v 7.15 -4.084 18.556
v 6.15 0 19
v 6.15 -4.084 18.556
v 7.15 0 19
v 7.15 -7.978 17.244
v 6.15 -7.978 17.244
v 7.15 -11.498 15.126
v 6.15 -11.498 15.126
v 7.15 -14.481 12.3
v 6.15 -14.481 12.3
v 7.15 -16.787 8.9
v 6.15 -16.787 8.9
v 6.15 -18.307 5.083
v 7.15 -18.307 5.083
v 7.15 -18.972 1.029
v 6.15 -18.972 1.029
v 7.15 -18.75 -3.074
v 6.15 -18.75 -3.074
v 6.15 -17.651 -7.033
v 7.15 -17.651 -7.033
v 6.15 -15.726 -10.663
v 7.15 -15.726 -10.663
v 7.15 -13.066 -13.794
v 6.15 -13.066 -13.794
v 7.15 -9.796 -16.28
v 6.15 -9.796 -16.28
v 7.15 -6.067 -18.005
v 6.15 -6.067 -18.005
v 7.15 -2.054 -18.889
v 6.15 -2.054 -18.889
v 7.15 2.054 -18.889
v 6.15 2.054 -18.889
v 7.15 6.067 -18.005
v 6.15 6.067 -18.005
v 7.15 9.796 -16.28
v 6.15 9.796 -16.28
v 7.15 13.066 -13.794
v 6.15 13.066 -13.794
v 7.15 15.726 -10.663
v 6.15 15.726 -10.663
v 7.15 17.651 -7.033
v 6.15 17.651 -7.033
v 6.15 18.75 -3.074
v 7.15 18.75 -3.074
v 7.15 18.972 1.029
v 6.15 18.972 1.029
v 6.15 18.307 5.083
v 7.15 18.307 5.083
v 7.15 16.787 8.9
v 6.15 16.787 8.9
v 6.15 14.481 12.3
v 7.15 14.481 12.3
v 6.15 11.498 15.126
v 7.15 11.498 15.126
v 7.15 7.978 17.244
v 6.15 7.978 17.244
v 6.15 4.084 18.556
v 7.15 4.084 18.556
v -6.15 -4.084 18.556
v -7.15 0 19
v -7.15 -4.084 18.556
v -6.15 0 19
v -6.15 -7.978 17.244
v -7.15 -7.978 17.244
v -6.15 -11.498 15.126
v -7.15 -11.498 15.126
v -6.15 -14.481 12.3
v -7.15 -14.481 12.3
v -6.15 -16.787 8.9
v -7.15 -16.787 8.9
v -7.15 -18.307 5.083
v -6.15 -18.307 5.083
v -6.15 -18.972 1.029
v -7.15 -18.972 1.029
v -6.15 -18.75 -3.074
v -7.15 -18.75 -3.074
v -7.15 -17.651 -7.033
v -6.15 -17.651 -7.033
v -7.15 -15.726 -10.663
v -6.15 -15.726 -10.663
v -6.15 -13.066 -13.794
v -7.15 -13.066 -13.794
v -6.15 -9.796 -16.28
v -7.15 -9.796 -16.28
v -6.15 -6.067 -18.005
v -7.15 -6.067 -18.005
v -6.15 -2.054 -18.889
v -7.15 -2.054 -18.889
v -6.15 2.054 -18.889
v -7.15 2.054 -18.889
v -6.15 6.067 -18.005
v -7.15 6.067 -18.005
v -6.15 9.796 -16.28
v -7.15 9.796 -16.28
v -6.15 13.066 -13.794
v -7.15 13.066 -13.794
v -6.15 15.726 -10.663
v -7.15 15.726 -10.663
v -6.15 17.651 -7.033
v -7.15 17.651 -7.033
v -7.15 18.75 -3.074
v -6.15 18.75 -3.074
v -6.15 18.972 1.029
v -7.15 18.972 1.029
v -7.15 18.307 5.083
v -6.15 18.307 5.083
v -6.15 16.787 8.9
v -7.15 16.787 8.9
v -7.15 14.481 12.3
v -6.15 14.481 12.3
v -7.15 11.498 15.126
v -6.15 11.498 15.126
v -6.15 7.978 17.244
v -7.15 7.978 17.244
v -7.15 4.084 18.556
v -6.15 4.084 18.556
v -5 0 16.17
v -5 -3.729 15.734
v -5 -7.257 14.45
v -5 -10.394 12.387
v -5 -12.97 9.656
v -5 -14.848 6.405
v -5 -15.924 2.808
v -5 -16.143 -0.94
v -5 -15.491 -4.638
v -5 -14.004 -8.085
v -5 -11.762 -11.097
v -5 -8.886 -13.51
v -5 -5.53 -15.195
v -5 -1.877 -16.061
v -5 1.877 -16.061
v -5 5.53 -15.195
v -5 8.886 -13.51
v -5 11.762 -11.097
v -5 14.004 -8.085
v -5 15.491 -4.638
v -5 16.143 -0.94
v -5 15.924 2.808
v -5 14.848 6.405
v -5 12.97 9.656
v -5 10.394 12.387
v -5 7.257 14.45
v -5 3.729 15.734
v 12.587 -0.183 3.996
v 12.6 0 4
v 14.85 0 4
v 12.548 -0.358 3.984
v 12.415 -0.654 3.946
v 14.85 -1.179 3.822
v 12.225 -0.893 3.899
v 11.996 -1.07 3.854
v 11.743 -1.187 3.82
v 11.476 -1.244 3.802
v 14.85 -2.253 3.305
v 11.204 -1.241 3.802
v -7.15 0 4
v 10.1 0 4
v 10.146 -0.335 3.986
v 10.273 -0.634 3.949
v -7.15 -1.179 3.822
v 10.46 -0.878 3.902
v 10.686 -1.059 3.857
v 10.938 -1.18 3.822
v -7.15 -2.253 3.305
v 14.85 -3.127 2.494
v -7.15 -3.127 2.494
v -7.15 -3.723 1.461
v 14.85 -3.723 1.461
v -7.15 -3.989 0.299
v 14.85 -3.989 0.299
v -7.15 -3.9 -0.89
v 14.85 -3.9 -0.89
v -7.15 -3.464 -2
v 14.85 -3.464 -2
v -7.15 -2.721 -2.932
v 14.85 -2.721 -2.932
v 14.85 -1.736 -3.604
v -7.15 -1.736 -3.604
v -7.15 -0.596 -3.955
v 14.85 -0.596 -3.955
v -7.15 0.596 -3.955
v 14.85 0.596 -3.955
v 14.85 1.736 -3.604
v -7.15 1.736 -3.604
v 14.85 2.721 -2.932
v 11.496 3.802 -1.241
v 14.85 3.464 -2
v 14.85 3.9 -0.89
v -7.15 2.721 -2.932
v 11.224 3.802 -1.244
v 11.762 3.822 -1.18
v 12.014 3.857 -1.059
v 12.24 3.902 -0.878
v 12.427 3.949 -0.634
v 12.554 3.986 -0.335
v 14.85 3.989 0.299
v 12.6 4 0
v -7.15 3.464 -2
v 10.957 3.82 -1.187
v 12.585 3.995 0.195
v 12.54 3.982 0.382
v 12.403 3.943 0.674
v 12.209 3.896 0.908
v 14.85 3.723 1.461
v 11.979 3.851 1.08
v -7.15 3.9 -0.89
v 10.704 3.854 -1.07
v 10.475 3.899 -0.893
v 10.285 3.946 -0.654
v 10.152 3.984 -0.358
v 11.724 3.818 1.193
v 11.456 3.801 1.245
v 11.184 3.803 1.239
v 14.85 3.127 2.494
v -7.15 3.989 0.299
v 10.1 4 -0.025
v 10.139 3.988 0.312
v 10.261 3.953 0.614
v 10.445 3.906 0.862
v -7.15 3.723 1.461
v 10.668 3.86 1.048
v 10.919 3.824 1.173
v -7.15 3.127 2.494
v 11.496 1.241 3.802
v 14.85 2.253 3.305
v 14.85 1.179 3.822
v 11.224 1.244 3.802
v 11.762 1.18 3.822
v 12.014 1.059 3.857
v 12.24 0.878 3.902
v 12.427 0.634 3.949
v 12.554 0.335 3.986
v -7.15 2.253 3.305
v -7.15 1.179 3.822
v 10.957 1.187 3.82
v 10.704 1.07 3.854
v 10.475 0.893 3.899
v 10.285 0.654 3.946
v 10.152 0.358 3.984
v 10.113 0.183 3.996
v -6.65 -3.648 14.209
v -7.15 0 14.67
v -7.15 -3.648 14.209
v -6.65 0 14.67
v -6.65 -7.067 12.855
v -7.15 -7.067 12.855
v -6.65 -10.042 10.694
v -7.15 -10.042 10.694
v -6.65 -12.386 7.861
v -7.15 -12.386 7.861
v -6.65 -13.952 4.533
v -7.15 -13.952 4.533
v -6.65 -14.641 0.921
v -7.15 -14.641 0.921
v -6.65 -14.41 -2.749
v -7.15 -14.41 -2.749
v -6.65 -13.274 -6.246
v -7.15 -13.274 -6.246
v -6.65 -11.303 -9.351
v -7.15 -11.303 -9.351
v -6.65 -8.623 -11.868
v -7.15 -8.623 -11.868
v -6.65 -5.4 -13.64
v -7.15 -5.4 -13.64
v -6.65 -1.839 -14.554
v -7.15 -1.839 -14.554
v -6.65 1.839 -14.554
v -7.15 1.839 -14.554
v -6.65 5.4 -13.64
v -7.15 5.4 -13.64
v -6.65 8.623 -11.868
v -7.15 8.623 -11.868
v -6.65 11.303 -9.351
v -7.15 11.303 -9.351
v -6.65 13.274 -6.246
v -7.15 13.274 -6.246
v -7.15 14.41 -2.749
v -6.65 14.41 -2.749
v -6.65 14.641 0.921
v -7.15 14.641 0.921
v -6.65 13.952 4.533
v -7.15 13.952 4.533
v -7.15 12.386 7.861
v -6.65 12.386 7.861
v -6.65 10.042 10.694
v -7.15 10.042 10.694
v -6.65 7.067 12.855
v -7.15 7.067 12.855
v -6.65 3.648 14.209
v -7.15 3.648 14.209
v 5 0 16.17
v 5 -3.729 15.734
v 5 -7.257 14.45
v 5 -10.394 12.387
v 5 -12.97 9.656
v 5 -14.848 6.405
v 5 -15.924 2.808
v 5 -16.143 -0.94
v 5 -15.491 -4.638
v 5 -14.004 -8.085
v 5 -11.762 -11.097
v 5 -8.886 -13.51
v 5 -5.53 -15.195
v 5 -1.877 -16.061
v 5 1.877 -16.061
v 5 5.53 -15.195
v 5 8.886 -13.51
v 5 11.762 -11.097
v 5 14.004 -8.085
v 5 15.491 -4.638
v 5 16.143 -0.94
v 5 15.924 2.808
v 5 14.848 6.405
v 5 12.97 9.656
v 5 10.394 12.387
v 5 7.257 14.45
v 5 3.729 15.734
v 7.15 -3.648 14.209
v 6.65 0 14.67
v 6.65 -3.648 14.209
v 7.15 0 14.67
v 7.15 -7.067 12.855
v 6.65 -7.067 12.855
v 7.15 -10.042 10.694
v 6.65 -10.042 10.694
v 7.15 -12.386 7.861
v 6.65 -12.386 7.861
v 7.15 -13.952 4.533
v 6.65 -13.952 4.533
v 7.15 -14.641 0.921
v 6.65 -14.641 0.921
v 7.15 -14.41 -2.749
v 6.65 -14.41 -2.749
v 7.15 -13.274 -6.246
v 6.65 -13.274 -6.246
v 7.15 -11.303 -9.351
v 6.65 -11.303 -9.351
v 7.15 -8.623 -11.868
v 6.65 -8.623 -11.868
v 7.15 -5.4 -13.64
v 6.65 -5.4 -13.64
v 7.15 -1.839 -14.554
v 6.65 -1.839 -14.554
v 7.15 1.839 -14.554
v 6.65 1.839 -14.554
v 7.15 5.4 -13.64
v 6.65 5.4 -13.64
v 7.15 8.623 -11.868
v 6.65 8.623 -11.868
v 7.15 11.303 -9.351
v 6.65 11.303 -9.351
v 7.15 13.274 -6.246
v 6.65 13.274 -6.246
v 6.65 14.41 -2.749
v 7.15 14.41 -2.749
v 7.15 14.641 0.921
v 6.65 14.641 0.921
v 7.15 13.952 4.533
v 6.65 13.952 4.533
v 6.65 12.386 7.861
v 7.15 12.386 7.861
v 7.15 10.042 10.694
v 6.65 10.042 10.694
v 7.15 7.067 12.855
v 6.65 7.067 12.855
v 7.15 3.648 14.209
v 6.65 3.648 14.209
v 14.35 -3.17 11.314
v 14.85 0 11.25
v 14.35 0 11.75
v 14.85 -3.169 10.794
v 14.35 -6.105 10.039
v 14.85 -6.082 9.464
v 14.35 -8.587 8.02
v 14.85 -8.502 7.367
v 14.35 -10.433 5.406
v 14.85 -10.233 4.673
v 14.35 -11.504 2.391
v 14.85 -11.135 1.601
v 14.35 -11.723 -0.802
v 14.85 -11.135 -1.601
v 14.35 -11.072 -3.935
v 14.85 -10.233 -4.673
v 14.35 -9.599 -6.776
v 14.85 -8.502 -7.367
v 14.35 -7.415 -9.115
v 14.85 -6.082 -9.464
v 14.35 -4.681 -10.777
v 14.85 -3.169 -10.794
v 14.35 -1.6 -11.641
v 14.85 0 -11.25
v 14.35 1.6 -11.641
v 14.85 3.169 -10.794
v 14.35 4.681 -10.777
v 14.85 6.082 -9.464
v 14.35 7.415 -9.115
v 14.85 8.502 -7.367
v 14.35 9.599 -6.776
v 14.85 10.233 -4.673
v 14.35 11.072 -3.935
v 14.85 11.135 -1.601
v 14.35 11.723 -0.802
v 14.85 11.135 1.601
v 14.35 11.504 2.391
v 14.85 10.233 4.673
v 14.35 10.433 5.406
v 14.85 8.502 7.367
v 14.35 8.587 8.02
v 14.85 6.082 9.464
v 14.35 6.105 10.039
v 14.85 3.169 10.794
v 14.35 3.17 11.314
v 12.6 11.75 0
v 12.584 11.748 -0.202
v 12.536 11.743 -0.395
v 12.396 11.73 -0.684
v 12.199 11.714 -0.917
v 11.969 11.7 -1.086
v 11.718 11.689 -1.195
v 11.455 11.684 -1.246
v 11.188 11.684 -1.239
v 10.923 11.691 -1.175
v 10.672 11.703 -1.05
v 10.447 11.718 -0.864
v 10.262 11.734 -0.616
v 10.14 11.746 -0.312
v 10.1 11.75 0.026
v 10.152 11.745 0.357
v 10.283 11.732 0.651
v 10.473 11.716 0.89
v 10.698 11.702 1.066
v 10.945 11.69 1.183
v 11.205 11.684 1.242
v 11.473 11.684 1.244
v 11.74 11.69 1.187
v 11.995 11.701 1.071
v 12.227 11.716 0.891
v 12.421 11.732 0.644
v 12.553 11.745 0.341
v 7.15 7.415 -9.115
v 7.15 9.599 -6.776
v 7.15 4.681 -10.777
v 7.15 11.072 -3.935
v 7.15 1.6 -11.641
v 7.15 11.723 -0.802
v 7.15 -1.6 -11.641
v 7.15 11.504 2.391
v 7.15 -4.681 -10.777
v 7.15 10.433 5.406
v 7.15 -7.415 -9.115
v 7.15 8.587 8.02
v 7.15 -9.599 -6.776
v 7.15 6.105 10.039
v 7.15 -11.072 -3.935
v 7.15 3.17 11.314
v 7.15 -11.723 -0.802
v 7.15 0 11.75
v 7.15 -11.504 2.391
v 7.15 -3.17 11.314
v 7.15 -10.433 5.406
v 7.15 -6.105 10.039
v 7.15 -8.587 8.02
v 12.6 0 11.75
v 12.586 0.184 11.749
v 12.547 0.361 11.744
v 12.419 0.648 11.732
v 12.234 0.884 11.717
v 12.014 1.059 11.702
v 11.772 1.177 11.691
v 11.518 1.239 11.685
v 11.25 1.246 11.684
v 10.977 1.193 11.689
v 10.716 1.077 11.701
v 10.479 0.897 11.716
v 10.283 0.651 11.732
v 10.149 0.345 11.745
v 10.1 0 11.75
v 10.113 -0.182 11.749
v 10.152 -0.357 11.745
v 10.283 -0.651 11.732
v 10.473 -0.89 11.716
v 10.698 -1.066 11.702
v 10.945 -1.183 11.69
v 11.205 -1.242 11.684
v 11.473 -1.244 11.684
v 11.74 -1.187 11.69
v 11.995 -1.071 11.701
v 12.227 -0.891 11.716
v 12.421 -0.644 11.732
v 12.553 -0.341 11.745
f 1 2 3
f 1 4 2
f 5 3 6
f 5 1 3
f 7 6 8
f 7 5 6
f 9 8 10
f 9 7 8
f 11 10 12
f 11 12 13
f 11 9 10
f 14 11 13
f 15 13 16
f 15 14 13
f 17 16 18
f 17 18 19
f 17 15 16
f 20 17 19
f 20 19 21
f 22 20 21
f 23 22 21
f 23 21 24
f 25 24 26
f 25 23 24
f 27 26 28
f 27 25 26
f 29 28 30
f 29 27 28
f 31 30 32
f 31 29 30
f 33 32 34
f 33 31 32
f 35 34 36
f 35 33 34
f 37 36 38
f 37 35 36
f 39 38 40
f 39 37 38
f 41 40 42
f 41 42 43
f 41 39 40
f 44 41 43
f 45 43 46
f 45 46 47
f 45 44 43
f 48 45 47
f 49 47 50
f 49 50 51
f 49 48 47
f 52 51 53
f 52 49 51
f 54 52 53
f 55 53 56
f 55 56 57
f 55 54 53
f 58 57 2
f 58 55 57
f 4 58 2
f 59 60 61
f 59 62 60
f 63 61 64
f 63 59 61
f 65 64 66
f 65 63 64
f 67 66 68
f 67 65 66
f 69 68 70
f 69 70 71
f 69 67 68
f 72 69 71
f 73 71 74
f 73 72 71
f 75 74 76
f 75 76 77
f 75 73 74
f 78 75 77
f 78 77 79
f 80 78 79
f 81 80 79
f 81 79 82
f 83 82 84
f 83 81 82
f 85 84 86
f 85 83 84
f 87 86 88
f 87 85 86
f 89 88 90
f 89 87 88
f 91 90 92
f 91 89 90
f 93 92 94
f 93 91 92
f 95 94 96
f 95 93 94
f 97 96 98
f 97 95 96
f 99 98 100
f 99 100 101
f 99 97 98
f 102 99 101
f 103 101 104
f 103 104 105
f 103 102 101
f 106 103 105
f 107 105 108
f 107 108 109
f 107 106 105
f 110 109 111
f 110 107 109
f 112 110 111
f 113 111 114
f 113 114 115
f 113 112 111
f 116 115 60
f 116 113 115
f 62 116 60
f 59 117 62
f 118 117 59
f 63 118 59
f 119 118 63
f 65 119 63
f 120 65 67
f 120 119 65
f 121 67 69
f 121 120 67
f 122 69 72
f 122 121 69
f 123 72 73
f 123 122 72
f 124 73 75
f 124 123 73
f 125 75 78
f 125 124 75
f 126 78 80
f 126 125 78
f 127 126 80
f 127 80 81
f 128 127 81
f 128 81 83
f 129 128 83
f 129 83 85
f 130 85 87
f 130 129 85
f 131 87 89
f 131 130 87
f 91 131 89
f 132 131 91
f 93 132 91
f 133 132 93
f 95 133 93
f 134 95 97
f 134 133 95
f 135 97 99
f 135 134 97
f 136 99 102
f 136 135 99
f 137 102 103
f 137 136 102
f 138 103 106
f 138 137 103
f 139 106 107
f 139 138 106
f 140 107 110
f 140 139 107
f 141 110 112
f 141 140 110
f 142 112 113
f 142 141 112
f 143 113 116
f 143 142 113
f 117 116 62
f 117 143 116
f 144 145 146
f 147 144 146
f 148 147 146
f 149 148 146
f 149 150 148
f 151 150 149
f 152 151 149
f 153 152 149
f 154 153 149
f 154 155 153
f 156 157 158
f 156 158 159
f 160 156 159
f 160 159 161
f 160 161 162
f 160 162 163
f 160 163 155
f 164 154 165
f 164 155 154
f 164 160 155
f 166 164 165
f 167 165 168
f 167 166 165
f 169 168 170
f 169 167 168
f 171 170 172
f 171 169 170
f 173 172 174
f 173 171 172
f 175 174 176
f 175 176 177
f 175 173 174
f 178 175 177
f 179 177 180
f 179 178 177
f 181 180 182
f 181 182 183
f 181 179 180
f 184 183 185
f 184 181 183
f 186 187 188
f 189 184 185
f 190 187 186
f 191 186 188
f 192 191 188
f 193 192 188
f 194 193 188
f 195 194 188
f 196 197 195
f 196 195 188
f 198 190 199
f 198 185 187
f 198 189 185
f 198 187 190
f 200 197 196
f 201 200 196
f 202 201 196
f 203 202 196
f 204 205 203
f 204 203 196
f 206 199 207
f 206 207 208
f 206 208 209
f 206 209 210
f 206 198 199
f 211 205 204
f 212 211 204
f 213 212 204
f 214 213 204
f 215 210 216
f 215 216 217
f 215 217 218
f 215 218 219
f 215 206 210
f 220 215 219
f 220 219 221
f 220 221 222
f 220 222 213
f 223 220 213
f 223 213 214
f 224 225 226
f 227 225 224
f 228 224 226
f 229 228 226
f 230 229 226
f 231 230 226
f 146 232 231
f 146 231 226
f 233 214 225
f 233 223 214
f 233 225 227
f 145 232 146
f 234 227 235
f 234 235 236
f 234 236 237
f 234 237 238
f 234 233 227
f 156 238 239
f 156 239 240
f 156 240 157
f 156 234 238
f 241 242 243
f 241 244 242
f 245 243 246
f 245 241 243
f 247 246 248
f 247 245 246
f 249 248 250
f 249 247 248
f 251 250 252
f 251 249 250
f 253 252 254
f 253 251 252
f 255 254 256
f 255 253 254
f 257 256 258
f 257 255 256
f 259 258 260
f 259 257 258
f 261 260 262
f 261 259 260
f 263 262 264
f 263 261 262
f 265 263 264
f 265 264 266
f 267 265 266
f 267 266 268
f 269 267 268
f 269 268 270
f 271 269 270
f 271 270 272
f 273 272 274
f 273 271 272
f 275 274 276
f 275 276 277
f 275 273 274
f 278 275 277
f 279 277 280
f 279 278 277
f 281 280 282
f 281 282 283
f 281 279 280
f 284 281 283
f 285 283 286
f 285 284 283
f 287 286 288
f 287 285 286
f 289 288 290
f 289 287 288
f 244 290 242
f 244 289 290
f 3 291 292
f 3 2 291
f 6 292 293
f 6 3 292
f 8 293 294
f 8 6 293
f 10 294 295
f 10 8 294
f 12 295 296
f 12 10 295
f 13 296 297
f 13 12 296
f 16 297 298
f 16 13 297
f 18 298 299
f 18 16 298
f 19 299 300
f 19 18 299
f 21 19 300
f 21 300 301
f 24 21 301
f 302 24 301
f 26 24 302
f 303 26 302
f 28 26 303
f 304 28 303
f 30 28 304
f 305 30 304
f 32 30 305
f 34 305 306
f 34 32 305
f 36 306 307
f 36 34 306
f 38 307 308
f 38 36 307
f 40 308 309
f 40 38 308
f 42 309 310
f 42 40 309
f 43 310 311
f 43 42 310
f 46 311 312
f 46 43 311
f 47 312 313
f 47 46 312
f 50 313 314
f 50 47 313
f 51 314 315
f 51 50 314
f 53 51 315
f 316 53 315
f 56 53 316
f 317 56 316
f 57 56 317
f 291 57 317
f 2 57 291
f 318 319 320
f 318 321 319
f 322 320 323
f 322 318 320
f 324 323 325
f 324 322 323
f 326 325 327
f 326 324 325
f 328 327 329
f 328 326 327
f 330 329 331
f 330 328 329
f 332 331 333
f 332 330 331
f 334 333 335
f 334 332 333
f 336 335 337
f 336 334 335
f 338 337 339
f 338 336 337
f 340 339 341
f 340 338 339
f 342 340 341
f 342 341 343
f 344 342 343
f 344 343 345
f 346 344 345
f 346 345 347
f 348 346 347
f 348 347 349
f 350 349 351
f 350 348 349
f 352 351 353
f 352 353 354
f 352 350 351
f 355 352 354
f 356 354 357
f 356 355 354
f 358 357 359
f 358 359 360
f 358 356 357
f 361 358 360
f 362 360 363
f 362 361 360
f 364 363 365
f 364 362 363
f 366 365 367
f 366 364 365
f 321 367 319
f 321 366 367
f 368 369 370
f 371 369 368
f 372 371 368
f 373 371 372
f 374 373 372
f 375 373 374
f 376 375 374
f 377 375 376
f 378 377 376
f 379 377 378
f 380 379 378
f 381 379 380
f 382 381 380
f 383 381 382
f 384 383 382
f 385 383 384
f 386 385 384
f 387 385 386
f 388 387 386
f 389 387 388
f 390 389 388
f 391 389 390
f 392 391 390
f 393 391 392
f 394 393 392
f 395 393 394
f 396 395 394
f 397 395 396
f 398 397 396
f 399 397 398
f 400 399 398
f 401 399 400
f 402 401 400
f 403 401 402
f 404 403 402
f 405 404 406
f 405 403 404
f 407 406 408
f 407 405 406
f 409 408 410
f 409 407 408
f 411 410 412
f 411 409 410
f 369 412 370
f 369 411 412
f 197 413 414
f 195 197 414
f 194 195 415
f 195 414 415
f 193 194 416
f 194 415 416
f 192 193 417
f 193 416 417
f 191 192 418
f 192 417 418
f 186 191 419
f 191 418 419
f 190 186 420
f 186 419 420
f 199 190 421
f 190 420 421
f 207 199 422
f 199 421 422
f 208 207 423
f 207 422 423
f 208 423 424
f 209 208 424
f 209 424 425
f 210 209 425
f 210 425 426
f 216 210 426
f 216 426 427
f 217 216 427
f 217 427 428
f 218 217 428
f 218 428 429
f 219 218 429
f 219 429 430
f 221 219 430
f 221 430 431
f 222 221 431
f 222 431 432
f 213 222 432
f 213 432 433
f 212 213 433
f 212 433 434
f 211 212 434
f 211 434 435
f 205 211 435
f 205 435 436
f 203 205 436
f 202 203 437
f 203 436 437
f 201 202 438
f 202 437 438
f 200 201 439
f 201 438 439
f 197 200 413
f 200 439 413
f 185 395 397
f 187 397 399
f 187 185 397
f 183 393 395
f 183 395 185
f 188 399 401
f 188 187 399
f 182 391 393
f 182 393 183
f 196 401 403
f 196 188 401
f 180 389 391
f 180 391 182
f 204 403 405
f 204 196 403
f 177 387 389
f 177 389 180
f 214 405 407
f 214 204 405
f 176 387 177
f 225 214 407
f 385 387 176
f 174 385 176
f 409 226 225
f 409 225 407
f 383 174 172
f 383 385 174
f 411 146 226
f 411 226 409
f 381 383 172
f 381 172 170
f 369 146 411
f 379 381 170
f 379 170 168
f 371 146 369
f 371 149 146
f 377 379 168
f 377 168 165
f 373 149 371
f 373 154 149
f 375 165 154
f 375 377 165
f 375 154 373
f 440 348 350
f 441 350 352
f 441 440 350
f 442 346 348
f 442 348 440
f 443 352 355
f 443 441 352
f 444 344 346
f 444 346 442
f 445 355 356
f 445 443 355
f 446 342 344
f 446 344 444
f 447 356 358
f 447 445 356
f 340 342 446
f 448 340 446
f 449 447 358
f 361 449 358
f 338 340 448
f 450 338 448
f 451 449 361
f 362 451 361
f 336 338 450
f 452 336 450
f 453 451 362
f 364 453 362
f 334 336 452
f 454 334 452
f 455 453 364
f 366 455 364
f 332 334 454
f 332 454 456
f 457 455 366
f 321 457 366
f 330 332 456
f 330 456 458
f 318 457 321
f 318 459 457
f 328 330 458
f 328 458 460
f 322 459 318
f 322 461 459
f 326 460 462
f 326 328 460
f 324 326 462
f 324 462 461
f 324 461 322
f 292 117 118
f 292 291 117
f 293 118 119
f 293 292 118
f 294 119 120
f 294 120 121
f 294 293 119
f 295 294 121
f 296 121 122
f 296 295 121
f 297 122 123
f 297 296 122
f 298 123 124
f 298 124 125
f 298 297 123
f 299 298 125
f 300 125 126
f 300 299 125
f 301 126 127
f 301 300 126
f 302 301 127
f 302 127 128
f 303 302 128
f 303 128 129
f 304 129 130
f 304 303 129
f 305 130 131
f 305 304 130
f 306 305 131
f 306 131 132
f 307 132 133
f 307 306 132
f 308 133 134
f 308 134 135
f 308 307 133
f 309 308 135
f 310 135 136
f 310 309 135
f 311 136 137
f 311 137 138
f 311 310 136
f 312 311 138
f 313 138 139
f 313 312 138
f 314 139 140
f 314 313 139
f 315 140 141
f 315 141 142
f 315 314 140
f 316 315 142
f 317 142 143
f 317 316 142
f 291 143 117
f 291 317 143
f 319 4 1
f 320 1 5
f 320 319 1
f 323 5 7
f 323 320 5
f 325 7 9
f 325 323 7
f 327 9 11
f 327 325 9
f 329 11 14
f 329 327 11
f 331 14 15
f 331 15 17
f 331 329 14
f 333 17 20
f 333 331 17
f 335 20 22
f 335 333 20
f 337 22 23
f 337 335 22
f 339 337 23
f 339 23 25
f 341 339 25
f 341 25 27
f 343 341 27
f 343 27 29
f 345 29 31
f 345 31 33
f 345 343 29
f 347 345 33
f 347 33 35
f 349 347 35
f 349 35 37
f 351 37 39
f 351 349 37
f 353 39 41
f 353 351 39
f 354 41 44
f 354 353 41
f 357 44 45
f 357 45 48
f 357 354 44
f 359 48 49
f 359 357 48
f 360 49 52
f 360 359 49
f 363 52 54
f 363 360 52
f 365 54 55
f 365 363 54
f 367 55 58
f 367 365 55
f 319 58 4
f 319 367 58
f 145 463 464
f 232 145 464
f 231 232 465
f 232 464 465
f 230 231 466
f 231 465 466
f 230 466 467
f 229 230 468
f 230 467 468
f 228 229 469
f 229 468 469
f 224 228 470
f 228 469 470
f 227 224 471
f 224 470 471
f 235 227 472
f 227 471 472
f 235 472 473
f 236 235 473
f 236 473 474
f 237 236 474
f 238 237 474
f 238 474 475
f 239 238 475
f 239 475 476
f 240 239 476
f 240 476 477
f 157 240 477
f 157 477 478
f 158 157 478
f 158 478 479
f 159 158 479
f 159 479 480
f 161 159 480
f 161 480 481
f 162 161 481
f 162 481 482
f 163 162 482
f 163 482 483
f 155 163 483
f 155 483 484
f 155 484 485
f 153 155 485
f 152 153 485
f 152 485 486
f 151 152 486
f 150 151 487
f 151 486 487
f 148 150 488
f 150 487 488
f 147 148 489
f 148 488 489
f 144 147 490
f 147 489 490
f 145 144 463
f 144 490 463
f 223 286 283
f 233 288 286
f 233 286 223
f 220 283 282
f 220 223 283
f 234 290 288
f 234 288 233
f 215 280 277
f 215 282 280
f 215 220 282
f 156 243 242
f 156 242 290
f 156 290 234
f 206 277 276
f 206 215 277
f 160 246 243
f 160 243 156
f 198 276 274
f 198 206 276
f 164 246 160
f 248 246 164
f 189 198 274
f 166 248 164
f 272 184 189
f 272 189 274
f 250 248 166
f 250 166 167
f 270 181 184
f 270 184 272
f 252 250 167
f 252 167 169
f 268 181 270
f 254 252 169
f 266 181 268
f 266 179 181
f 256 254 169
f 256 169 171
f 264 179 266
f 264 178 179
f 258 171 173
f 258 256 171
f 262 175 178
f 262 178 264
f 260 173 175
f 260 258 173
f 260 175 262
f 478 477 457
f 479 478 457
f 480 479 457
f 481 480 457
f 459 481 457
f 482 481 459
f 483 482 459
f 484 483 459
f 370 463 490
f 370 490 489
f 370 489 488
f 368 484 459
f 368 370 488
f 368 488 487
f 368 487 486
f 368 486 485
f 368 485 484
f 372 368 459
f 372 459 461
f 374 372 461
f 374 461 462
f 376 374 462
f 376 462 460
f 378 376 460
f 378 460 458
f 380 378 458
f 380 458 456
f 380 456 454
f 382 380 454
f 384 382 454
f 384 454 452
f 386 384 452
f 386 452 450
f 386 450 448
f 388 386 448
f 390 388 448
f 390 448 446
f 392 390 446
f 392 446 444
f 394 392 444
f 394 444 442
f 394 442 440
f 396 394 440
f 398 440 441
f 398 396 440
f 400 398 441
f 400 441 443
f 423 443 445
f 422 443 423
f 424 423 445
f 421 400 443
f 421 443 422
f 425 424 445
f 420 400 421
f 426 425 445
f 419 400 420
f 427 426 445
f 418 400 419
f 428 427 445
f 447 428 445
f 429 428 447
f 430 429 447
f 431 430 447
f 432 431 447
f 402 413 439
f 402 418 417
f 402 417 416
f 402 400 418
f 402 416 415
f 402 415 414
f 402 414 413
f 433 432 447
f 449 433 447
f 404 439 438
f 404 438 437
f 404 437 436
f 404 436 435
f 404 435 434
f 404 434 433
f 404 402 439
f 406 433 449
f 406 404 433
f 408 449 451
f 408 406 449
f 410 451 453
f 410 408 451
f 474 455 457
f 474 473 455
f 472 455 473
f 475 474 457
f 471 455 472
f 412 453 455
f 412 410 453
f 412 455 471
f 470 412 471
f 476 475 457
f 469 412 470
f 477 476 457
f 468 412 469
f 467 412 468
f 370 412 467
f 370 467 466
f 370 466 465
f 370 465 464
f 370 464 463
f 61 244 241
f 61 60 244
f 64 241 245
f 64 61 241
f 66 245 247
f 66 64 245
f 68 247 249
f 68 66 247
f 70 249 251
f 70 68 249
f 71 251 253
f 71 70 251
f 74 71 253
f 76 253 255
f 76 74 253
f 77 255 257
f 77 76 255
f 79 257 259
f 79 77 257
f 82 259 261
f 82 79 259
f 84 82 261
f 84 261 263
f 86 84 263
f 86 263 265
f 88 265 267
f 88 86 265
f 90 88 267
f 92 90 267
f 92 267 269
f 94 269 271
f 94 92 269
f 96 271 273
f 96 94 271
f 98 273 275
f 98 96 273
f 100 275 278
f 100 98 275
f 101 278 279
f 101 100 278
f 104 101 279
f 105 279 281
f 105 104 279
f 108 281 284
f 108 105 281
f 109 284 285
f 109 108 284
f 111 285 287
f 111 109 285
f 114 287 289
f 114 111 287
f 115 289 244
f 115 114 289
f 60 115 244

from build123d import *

# Parameters (mm, degrees)
CHAMFER1_SIZE          = 0.5
TROU_TARAUD_M30_REACH  = 42.606
TROU_TARAUD_M30_BORE_R = 1.25
CIRPATTERN1_COUNT      = 2
CIRPATTERN1_ANGLE      = 90


with BuildPart() as part:
    # Sketch1 → Revolve1 (revolve)
    with BuildSketch(Plane.XY, mode=Mode.PRIVATE) as revolve1_sk:
        Polygon((-7.15, 4), (-7.15, 14.67), (-6.65, 14.67), (-7.15, 19), (-6.15, 19), (-5, 16.17), (5, 16.17), (6.15, 19), (7.15, 19), (6.65, 14.67), (7.15, 14.67), (7.15, 11.75), (14.85, 11.75), (14.85, 4), align=None)
    revolve(revolve1_sk.sketch.rotate(Axis((0, 0, 0), (1, 0, 0)), 90), axis=Axis((0, 0, 0), (1, 0, 0)))

    # Chamfer1
    chamfer1_edges = [part.edges().sort_by_distance(p)[0] for p in [
        (14.85, 0, -11.75),
    ]]
    chamfer(chamfer1_edges, length=CHAMFER1_SIZE)

    # Trou taraudé M30 bore (on position points) → Trou taraudé M30 (cut, up to next)
    with BuildSketch(Plane(origin=(11.35, 0, 11.75), x_dir=(1, 0, 0), z_dir=(0, 0, 1)), mode=Mode.PRIVATE) as trou_taraud_m30_sk1:
        Circle(TROU_TARAUD_M30_BORE_R)
    trou_taraud_m30_tool1 = extrude(trou_taraud_m30_sk1.sketch, amount=-TROU_TARAUD_M30_REACH, mode=Mode.PRIVATE) & part.part
    trou_taraud_m30 = trou_taraud_m30_tool1.solids().sort_by_distance((11.35, 0, 11.75))[0]
    add(trou_taraud_m30, mode=Mode.SUBTRACT)

    # CirPattern1: Trou taraudé M30 ×2 about axis
    cirpattern1_axis = Axis((7.15, 0, 0), (-1, 0, 0))
    for i in range(1, CIRPATTERN1_COUNT):
        add(trou_taraud_m30.rotate(cirpattern1_axis, i * CIRPATTERN1_ANGLE / (CIRPATTERN1_COUNT - 1)), mode=Mode.SUBTRACT)


solid = part.part
